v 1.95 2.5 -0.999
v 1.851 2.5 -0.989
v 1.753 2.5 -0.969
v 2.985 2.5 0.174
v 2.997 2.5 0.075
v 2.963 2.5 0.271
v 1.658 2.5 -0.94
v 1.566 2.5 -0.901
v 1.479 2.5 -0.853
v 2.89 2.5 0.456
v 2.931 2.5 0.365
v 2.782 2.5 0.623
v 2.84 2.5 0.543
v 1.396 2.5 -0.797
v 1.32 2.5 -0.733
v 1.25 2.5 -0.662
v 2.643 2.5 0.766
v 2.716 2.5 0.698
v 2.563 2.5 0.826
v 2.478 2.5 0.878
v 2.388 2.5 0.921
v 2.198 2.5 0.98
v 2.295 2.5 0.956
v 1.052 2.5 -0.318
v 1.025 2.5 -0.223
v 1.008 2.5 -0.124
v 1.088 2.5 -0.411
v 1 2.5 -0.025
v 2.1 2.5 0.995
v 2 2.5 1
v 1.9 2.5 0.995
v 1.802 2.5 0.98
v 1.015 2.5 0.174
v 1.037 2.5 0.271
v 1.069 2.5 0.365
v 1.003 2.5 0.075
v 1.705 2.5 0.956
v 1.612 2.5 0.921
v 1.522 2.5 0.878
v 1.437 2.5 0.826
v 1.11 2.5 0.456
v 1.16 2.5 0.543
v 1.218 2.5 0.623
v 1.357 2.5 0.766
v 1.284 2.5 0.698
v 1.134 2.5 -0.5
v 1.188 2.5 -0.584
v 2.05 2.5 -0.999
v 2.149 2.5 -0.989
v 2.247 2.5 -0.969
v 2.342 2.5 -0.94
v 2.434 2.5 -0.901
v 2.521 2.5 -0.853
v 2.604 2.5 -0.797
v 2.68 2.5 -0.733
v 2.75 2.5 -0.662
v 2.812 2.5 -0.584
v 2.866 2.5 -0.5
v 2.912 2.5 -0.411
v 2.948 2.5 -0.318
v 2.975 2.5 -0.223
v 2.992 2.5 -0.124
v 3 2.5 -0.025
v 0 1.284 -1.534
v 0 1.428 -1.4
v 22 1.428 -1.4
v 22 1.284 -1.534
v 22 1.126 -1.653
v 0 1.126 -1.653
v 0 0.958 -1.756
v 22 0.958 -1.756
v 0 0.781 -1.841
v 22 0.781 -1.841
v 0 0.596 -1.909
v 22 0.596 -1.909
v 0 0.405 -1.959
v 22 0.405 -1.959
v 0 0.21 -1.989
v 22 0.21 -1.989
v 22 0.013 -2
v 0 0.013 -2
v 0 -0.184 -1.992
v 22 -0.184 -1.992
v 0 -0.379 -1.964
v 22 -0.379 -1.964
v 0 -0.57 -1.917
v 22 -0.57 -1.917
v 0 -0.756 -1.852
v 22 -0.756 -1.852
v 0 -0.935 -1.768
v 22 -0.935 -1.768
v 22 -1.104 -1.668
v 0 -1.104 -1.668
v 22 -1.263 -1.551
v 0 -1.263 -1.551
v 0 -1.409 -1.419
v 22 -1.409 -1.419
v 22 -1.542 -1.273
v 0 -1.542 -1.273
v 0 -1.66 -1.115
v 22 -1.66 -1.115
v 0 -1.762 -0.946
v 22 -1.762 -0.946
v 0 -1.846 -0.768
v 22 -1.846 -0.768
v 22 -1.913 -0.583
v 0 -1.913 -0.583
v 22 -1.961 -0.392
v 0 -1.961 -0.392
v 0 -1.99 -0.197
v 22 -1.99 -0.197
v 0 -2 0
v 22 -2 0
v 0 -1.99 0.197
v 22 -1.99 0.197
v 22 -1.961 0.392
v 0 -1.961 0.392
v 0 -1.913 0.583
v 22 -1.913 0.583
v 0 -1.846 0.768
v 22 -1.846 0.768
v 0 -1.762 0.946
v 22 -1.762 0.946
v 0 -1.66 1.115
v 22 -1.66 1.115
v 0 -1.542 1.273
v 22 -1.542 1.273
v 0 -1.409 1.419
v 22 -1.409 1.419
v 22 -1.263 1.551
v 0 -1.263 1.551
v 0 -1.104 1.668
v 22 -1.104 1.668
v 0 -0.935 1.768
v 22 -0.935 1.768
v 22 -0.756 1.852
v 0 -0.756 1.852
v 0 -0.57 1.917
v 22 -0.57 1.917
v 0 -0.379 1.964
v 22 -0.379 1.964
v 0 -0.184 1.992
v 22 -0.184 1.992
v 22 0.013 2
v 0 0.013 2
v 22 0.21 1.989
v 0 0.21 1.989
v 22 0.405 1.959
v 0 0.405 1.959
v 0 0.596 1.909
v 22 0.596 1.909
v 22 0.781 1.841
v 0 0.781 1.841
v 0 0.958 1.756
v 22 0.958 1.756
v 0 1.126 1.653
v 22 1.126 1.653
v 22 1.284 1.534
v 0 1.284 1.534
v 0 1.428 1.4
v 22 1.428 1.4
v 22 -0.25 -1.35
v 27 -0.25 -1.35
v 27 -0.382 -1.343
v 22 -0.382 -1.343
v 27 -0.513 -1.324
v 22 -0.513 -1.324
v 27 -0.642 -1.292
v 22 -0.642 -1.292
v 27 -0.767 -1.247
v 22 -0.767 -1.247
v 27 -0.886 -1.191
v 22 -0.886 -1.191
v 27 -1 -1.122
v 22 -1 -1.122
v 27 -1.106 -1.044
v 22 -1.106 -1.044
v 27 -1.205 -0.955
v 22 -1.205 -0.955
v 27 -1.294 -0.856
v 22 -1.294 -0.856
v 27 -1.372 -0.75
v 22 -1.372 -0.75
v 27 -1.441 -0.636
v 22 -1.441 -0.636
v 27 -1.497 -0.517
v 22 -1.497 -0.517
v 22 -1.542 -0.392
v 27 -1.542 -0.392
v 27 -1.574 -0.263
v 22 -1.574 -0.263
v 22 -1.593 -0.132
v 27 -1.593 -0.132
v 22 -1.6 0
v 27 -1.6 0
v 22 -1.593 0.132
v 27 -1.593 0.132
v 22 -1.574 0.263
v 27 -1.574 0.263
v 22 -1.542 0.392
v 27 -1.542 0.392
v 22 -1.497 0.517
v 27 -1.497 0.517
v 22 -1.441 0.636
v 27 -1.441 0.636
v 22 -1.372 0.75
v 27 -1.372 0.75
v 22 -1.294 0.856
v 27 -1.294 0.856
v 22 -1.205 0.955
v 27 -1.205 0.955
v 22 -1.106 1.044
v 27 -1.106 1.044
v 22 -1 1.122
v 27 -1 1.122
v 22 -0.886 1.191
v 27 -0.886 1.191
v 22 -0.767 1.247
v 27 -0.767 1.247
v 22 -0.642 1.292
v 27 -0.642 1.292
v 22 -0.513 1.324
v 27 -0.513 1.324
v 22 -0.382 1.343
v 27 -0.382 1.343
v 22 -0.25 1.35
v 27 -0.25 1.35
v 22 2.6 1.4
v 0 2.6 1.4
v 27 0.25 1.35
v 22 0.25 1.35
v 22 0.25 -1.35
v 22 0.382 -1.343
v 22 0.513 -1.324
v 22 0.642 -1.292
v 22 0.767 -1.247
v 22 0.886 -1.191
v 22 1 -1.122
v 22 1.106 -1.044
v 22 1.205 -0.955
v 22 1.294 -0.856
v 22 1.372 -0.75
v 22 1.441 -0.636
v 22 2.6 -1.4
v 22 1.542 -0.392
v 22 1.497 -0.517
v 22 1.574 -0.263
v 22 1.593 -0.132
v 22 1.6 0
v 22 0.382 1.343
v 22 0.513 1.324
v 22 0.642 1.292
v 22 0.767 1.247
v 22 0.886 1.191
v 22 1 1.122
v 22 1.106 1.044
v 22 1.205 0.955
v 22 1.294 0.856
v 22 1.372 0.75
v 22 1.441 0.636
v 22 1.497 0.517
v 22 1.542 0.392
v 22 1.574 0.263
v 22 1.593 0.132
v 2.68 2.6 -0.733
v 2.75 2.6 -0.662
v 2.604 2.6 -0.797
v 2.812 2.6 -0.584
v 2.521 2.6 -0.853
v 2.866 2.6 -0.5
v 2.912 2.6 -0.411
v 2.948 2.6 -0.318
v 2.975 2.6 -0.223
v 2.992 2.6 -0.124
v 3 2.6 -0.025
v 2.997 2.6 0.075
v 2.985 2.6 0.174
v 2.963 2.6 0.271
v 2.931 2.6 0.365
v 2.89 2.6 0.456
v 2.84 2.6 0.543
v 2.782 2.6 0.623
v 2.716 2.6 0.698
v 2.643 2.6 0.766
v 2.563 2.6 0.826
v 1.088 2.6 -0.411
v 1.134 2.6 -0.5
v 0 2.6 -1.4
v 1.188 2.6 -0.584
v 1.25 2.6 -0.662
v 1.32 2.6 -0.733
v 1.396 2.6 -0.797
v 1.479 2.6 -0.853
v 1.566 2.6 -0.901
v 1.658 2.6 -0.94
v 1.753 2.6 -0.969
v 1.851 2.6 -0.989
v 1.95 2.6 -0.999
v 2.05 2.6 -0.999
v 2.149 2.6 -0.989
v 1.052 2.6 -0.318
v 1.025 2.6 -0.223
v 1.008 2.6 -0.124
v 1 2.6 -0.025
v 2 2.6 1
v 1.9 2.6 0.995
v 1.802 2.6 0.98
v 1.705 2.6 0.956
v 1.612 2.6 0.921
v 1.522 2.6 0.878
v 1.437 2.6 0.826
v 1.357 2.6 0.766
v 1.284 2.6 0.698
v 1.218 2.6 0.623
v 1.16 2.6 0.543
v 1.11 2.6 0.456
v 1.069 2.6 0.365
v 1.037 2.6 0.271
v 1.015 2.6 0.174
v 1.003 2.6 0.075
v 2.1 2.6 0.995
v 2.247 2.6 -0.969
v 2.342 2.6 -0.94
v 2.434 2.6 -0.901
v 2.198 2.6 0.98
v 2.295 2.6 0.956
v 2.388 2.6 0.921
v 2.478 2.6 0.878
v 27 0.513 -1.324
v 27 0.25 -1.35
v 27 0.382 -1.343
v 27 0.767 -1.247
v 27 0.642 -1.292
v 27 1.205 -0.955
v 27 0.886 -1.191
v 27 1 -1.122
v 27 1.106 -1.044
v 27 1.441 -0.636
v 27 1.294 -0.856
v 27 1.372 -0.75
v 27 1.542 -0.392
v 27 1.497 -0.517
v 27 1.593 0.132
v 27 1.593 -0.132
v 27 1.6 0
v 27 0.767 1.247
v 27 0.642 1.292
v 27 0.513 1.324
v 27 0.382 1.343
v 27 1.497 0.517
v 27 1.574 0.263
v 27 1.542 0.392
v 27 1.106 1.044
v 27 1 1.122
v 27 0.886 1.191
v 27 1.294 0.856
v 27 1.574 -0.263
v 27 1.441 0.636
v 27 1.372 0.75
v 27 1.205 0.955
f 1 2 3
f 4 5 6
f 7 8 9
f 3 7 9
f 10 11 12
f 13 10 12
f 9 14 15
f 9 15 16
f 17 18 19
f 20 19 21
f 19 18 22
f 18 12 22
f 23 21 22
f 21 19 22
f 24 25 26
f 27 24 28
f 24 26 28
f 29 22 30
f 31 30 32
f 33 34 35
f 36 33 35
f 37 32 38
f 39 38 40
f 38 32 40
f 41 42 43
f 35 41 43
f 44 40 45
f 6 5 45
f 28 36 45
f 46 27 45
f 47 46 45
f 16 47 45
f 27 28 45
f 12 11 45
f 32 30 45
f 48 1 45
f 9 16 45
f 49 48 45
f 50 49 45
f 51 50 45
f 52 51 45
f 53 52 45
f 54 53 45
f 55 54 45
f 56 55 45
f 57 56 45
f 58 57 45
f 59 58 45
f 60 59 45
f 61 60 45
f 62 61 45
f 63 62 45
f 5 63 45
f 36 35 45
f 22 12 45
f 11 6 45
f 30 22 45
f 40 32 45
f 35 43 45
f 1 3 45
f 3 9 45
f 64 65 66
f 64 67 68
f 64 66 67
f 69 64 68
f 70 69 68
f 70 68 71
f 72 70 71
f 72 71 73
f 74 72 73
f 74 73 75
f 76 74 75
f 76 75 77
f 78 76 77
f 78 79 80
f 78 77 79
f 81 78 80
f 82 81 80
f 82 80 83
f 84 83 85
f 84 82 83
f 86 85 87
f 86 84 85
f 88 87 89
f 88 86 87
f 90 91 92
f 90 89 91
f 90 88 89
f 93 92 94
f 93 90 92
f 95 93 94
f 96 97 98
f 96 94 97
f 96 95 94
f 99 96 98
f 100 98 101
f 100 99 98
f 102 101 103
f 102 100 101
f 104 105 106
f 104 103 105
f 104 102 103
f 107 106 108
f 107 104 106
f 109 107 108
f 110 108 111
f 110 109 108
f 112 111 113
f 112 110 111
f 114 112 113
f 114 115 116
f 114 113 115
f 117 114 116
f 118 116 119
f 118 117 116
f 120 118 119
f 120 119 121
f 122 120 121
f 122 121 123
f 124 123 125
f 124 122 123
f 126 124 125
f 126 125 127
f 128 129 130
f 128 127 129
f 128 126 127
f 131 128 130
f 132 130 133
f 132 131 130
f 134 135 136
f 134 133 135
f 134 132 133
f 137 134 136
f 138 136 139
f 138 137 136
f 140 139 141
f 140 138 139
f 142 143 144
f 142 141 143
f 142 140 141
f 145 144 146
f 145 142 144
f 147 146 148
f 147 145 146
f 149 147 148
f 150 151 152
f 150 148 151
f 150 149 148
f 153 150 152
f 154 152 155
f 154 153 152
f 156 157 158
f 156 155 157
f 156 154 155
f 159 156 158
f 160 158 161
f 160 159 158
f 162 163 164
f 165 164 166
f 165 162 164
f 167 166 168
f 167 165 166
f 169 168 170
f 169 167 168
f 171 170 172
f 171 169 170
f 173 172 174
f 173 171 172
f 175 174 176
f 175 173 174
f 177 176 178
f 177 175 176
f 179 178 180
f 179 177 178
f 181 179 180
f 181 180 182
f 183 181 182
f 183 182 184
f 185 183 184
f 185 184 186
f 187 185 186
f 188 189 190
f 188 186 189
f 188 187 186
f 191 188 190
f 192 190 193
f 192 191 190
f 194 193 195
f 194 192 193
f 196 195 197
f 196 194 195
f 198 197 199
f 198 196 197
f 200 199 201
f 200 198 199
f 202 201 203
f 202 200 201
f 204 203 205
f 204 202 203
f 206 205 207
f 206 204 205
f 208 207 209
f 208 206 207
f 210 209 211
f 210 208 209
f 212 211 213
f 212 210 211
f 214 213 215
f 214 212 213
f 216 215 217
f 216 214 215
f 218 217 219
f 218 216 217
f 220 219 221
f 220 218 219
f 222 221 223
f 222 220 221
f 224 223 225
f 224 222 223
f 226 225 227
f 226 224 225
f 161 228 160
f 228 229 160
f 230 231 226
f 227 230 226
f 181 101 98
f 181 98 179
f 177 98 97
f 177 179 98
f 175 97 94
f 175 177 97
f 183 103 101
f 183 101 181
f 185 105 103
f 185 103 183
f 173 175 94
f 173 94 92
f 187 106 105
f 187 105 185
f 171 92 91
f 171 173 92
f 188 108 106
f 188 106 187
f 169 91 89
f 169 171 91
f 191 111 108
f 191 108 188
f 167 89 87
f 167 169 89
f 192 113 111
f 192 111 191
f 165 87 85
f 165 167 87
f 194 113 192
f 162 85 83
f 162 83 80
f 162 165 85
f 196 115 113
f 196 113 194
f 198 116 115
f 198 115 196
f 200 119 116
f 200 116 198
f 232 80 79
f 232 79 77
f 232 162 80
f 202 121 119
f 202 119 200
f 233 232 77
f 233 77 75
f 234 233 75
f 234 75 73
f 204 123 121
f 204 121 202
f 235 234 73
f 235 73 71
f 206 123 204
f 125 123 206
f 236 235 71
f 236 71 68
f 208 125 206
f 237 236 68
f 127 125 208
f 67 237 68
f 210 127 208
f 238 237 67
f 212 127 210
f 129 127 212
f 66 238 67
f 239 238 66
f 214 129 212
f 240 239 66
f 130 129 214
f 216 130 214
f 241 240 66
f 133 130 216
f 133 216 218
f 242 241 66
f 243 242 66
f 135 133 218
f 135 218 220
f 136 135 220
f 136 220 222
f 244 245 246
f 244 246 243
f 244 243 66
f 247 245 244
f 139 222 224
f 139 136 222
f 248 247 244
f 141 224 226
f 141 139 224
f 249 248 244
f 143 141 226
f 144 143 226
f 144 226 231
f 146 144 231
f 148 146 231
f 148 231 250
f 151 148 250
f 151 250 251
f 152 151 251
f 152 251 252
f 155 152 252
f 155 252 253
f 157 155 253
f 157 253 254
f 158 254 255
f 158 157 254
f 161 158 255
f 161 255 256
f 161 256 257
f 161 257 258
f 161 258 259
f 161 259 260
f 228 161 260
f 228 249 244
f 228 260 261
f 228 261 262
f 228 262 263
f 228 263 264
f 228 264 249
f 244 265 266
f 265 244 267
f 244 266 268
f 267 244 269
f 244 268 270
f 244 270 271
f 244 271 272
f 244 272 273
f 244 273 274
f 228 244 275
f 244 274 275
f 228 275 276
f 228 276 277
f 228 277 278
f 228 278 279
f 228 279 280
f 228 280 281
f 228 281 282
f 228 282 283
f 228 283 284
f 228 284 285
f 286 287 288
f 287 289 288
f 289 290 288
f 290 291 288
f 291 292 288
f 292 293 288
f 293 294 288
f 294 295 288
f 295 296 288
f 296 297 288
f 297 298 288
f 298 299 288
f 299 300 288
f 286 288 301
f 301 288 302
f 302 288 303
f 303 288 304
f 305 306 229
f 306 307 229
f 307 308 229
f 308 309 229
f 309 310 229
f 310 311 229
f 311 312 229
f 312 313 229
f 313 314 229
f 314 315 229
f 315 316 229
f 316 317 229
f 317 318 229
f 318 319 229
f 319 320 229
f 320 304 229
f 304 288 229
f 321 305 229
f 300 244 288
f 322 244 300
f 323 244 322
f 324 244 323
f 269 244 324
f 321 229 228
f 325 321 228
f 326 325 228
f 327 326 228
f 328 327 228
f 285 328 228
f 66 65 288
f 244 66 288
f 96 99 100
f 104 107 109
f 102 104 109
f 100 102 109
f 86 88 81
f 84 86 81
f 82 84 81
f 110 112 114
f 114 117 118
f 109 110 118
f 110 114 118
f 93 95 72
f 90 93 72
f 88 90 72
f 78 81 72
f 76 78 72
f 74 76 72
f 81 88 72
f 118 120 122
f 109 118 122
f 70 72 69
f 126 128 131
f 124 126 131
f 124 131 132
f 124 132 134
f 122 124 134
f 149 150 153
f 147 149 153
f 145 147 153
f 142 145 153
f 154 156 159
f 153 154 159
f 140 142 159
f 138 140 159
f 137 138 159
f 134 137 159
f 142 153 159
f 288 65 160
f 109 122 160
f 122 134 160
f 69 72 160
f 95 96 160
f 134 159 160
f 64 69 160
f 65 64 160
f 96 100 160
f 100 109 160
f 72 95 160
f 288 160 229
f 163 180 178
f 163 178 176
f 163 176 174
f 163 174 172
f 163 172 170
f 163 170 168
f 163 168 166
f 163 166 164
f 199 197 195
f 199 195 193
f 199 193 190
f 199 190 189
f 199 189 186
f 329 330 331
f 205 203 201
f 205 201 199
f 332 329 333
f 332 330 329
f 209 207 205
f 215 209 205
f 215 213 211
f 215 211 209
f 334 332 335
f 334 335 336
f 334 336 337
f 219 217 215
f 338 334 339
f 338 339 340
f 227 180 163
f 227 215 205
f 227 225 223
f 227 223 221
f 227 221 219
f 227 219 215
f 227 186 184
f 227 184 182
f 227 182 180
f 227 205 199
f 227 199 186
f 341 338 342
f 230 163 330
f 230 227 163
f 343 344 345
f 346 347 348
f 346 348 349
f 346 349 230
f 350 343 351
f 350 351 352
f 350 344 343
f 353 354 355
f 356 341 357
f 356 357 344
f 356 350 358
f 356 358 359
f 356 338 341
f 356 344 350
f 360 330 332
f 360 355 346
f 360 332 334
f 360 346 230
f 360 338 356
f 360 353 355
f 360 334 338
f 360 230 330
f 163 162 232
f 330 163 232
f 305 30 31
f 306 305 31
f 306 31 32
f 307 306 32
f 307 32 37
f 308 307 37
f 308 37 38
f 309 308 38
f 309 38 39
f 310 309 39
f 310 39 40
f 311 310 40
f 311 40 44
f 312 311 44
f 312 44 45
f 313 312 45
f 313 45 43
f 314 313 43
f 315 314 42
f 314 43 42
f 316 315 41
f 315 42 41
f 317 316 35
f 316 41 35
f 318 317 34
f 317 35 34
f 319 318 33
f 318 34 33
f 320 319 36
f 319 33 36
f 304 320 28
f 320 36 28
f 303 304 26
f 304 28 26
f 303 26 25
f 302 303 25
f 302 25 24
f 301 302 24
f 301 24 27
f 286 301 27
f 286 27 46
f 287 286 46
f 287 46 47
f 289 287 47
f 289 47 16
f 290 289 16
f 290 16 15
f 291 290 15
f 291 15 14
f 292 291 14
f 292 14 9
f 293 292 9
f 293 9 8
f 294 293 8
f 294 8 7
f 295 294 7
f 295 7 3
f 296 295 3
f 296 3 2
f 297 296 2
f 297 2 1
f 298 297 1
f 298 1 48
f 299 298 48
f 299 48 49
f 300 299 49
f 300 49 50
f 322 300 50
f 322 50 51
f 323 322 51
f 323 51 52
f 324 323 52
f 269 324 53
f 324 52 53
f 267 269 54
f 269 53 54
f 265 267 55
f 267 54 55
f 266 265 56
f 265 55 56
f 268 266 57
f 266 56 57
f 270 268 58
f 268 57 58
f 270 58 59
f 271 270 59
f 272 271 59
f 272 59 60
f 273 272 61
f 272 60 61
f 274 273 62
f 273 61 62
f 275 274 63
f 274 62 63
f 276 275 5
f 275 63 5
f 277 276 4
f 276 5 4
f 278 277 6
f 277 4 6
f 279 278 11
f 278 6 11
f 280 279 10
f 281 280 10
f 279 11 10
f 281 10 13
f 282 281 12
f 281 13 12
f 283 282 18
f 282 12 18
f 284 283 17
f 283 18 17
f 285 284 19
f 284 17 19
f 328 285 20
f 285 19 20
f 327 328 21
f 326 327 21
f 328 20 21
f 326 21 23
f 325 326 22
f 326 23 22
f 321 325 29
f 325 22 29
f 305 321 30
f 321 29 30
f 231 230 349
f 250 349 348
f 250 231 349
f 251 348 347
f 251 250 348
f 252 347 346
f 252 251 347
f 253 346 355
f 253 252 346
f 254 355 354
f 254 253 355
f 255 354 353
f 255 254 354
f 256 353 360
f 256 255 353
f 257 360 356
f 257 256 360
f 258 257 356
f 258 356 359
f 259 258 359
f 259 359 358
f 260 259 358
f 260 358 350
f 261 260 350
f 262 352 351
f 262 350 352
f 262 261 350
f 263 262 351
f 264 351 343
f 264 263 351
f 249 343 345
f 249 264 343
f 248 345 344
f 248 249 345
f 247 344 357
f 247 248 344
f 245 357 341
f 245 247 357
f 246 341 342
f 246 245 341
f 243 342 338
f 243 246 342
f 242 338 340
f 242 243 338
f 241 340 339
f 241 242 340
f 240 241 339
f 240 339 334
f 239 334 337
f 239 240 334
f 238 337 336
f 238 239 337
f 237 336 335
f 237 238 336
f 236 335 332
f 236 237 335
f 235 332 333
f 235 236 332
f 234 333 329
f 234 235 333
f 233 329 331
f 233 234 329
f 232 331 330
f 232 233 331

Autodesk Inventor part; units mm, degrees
sketch "Sketch_12" plane through (0, 0, 0) normal (1, 0, 0) x (0, 1, 0)
  arc A0 (1.4283, 1.4) -> (1.4283, -1.4) centre (0, 0) ccw
  line L0 (1.4283, -1.4) -> (2.6, -1.4)
  line L1 (2.6, -1.4) -> (2.6, 1.4)
  line L2 (2.6, 1.4) -> (1.4283, 1.4)
extrude "Extrusion1" add sketch "Sketch_12" along normal blind 22
sketch "Sketch_13" plane through (0, 0, 0) normal (1, 0, 0) x (0, 1, 0)
  line L0 (0.25, 1.35) -> (-0.25, 1.35)
  arc A0 (-0.25, 1.35) -> (-0.25, -1.35) centre (-0.25, 0) ccw
  line L1 (-0.25, -1.35) -> (0.25, -1.35)
  arc A1 (0.25, -1.35) -> (0.25, 1.35) centre (0.25, 0) ccw
extrude "Extrusion2" add sketch "Sketch_13" along normal blind 27
sketch "Sketch3" plane through (0, 2.6, 1.4) normal (0, 1, 0) x (1, 0, 0)
  point P0 (2, 1.4)
hole "Hole1" at (2, 2.6, 0) direction (0, -1, 0) diameter 2 depth 0.1
ref_plane "SW_SM_XY" through (0, 0, 0) normal (1, 0, 0) x (0, 0, -1)
ref_plane "SW_SM_YZ" through (0, 0, 0) normal (0, 0, -1) x (0, 1, 0)
ref_plane "SW_SM_ZX" through (0, 0, 0) normal (0, 1, 0) x (1, 0, 0)
properties part number "CP96-M9P_SW" material "Stainless Steel, Polished"
